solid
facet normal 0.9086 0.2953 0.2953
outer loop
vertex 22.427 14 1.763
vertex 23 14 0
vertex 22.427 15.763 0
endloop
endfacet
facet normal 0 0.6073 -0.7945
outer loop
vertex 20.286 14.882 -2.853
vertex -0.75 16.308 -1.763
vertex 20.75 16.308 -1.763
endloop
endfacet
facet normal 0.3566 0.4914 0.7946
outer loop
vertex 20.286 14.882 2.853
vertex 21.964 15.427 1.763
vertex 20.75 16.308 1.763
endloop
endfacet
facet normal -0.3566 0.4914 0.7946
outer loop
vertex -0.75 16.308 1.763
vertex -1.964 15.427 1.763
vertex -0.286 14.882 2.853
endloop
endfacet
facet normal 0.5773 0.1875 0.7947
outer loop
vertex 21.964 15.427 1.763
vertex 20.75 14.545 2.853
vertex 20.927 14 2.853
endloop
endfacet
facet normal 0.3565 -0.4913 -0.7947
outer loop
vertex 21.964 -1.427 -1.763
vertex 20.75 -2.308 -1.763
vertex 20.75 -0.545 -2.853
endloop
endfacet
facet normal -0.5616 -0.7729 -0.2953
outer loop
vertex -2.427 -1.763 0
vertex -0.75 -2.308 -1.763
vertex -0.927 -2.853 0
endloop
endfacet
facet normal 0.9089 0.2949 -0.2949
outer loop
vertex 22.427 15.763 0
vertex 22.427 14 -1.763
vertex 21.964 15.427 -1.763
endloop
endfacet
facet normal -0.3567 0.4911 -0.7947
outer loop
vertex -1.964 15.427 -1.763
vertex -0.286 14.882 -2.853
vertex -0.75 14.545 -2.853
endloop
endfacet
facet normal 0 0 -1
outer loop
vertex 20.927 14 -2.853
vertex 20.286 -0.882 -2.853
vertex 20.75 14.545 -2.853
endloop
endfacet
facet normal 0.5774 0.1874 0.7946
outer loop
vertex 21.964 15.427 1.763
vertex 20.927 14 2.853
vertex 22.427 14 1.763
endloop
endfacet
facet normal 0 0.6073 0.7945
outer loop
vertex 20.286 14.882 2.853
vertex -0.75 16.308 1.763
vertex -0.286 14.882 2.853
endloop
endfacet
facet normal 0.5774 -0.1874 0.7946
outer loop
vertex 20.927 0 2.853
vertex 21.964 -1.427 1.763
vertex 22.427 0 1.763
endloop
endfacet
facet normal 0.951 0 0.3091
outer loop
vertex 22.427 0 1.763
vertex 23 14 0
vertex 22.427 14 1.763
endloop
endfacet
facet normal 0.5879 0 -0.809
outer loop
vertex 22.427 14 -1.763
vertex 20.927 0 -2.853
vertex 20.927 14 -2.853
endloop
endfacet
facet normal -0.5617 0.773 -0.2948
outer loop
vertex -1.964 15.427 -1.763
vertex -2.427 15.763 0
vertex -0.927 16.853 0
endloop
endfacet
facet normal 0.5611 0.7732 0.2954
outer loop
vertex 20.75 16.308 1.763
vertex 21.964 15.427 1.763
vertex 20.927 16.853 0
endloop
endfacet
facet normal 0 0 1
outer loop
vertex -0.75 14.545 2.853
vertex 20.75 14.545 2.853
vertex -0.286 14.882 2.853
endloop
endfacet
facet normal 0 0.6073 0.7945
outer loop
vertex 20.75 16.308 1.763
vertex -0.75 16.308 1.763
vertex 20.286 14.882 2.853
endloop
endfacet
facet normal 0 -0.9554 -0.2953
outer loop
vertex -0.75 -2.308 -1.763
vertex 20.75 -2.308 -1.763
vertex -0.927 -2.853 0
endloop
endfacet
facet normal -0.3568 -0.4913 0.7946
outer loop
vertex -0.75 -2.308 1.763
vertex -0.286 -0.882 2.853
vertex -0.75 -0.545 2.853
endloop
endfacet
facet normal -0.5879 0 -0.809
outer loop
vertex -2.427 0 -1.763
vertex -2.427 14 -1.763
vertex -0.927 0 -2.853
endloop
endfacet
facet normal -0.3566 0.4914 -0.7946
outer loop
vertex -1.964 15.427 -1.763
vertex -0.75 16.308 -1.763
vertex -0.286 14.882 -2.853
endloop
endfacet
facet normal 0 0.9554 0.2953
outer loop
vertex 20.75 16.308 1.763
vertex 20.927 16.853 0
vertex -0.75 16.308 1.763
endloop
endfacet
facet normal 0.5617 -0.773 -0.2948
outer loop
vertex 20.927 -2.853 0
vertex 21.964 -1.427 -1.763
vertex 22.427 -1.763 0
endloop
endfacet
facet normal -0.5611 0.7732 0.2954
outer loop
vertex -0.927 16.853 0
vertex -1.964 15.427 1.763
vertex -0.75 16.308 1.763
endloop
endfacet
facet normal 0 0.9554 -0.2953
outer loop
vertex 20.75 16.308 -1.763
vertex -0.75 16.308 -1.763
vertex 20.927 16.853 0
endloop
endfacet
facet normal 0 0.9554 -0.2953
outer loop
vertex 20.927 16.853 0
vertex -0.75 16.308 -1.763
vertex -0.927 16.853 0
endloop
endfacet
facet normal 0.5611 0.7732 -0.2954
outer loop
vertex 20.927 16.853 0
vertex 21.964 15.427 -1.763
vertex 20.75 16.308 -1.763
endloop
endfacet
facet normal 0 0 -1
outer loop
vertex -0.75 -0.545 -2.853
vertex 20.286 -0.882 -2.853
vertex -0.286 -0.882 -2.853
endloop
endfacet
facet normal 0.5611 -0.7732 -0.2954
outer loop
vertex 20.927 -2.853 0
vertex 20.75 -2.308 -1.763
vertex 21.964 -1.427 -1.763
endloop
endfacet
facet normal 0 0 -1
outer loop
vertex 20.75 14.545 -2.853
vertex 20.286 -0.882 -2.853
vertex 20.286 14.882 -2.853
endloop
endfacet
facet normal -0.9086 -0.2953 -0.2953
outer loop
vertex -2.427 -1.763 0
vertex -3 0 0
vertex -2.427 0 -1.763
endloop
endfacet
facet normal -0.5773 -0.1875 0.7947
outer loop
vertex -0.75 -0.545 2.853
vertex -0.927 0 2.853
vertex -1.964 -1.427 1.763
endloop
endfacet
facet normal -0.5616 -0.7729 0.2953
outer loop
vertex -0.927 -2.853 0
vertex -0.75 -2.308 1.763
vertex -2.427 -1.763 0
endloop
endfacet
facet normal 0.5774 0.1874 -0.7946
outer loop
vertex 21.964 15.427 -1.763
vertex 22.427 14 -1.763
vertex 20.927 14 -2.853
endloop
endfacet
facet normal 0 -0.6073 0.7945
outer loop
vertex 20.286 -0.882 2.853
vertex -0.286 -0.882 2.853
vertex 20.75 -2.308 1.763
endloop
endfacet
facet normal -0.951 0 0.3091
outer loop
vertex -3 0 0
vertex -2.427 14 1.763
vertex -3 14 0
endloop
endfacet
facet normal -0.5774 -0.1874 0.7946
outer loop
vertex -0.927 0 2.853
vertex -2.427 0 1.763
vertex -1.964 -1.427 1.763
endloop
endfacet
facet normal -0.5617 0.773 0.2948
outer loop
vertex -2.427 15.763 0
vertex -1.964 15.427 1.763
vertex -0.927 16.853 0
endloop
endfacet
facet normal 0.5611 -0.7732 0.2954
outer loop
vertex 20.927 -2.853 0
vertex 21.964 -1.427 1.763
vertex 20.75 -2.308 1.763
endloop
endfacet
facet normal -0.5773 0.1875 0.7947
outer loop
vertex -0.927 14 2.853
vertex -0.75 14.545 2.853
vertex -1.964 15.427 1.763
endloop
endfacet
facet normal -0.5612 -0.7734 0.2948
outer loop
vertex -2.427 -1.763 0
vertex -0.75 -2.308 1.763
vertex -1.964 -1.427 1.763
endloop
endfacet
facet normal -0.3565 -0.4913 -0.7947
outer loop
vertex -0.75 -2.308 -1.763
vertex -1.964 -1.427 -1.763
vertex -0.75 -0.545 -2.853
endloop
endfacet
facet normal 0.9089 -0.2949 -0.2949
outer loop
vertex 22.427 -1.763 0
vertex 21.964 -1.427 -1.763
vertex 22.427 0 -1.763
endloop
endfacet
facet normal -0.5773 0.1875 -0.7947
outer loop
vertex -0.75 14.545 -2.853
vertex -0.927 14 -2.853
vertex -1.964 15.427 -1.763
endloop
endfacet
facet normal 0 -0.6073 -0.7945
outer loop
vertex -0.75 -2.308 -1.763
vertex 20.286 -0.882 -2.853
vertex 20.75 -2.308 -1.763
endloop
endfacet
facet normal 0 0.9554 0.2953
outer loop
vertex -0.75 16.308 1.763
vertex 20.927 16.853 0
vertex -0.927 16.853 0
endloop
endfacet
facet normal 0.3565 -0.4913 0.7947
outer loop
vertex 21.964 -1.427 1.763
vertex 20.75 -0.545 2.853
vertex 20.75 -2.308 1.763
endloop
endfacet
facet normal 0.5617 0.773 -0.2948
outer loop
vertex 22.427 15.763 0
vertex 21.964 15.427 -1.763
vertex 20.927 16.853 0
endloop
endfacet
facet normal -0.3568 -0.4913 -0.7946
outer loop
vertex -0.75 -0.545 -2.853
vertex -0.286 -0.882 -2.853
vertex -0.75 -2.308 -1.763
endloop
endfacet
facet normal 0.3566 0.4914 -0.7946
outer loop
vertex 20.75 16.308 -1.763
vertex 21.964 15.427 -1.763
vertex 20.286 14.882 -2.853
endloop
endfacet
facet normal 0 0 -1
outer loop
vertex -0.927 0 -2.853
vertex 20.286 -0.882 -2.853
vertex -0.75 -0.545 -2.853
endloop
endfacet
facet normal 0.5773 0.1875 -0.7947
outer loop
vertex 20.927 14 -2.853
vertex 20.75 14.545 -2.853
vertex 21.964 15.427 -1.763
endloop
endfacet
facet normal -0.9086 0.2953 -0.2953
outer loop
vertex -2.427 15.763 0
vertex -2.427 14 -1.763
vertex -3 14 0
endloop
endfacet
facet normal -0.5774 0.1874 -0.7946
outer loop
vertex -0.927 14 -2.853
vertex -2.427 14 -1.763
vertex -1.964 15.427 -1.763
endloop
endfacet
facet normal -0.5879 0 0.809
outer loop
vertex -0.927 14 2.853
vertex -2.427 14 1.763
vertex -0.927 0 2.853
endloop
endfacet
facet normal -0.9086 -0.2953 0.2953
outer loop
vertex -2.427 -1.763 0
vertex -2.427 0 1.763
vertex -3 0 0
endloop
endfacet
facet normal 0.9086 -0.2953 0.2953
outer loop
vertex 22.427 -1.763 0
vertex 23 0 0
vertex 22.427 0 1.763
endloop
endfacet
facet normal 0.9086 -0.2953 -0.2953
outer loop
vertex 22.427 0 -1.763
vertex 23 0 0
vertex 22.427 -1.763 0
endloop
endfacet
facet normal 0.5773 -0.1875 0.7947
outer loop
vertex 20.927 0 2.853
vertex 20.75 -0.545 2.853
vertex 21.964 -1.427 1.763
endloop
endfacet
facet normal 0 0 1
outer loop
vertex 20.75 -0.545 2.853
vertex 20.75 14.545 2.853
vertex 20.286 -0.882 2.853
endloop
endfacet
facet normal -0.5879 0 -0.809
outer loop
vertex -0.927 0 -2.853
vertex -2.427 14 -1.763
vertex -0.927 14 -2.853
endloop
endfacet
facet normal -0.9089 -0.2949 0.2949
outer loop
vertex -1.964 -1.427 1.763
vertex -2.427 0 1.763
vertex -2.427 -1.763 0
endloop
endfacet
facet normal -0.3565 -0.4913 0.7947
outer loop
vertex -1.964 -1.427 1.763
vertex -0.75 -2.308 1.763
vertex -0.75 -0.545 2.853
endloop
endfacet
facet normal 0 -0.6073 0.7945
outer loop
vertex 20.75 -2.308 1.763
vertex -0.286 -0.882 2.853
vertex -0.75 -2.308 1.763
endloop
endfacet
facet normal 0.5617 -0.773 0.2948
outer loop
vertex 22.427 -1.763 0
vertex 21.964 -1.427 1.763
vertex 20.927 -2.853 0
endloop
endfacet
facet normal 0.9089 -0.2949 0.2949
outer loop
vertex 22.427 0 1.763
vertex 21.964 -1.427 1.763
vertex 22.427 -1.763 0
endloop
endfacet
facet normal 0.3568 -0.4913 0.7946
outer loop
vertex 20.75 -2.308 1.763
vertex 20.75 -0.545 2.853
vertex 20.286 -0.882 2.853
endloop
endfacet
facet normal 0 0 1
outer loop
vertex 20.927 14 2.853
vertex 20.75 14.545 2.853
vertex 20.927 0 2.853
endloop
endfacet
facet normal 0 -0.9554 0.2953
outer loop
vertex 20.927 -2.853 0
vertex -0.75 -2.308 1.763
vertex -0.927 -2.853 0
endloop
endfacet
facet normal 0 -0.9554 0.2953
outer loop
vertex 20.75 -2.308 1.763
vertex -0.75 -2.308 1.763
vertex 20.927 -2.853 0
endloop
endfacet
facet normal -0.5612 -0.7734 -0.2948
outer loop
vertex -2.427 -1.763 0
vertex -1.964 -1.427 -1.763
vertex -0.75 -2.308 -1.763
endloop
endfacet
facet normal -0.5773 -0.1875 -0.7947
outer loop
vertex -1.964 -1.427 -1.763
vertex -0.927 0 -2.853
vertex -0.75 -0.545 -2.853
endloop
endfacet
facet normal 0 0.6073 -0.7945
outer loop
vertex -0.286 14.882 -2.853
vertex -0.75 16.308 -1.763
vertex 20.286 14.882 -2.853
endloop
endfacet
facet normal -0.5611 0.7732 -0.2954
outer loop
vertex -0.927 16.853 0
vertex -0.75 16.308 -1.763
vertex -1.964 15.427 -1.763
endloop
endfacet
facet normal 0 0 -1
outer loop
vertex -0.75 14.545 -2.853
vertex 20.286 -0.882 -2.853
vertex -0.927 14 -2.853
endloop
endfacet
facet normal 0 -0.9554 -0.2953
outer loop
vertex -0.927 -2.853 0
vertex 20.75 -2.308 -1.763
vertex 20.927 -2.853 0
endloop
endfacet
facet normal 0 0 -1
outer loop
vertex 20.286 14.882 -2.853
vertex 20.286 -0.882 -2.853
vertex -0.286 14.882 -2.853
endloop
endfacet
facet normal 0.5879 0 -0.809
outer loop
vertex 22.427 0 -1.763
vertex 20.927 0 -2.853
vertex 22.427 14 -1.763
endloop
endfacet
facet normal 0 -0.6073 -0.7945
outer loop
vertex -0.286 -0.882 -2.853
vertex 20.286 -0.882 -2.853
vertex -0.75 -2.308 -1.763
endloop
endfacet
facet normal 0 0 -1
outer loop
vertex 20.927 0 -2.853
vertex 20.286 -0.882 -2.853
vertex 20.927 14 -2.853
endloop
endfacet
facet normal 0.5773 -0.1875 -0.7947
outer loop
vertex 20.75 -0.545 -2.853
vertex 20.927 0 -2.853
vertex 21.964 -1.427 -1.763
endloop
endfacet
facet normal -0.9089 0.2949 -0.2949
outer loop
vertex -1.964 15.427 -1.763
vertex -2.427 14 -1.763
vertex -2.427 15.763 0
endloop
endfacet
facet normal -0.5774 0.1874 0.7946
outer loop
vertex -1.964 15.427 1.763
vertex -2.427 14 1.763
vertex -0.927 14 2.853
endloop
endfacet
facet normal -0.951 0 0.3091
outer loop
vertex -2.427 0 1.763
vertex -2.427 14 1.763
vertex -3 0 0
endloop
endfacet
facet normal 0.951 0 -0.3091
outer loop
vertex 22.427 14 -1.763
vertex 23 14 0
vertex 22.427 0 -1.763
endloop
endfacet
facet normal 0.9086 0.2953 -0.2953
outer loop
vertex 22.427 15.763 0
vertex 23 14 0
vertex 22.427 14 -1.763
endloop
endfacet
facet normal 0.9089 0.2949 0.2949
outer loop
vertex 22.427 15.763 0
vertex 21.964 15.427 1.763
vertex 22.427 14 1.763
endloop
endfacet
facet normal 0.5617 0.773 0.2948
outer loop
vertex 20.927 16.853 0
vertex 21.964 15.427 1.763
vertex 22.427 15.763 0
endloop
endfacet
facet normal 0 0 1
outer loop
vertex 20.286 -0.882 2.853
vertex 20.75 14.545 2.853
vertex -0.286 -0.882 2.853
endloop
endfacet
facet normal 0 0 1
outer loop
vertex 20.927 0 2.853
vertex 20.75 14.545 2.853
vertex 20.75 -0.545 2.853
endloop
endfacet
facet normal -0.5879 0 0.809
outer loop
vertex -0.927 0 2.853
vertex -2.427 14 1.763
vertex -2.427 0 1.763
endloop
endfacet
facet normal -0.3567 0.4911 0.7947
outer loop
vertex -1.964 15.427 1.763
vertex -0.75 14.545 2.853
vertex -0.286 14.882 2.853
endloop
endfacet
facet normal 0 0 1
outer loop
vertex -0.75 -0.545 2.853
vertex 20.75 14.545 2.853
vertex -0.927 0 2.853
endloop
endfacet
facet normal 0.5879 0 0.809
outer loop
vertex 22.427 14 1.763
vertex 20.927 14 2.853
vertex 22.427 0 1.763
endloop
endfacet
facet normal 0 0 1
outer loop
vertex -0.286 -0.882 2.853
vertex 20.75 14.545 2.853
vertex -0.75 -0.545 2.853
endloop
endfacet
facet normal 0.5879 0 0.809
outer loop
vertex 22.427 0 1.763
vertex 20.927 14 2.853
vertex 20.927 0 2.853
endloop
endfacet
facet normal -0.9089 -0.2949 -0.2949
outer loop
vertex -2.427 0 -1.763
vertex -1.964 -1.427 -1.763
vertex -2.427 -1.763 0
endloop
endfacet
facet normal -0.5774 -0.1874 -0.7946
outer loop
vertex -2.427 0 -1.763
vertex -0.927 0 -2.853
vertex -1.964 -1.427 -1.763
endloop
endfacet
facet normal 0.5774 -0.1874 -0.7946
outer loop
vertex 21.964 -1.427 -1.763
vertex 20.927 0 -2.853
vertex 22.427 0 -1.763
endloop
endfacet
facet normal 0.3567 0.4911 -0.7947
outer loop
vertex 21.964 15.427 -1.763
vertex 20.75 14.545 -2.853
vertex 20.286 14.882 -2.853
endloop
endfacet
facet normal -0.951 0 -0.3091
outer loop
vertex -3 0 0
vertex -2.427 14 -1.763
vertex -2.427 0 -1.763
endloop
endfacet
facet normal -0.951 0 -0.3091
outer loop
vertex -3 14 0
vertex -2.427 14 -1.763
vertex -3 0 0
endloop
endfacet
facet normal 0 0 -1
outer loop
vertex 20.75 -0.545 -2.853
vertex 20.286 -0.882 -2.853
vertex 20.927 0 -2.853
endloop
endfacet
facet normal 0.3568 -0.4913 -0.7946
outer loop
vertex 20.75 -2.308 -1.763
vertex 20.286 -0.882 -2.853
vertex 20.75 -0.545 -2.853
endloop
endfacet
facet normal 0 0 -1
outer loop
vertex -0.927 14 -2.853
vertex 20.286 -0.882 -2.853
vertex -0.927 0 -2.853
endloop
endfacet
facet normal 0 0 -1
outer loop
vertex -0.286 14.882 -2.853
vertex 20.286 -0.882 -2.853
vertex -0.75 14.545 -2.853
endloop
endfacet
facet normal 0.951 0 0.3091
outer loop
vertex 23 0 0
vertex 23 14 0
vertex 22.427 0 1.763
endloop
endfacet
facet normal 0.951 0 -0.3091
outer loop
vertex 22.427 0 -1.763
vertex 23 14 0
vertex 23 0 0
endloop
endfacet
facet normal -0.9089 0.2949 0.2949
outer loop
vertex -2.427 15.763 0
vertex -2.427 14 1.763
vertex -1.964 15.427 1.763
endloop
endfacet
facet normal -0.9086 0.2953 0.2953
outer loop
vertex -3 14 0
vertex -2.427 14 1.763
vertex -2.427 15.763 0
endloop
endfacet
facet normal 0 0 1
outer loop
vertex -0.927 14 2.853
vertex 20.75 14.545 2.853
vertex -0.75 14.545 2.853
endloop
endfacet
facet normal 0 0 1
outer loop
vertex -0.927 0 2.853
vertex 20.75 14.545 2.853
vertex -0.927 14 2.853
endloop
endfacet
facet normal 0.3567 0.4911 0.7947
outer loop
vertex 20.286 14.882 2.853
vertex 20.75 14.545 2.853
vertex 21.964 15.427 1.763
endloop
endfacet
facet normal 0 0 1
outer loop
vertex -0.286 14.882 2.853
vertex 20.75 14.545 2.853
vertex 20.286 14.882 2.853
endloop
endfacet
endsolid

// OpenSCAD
// hull over co-planar equal-radius spheres (the degenerate-hull path)
hull() {
    translate([0, 0, 0]) sphere(r = 3);
    translate([20, 0, 0]) sphere(r = 3);
    translate([20, 14, 0]) sphere(r = 3);
    translate([0, 14, 0]) sphere(r = 3);
}
